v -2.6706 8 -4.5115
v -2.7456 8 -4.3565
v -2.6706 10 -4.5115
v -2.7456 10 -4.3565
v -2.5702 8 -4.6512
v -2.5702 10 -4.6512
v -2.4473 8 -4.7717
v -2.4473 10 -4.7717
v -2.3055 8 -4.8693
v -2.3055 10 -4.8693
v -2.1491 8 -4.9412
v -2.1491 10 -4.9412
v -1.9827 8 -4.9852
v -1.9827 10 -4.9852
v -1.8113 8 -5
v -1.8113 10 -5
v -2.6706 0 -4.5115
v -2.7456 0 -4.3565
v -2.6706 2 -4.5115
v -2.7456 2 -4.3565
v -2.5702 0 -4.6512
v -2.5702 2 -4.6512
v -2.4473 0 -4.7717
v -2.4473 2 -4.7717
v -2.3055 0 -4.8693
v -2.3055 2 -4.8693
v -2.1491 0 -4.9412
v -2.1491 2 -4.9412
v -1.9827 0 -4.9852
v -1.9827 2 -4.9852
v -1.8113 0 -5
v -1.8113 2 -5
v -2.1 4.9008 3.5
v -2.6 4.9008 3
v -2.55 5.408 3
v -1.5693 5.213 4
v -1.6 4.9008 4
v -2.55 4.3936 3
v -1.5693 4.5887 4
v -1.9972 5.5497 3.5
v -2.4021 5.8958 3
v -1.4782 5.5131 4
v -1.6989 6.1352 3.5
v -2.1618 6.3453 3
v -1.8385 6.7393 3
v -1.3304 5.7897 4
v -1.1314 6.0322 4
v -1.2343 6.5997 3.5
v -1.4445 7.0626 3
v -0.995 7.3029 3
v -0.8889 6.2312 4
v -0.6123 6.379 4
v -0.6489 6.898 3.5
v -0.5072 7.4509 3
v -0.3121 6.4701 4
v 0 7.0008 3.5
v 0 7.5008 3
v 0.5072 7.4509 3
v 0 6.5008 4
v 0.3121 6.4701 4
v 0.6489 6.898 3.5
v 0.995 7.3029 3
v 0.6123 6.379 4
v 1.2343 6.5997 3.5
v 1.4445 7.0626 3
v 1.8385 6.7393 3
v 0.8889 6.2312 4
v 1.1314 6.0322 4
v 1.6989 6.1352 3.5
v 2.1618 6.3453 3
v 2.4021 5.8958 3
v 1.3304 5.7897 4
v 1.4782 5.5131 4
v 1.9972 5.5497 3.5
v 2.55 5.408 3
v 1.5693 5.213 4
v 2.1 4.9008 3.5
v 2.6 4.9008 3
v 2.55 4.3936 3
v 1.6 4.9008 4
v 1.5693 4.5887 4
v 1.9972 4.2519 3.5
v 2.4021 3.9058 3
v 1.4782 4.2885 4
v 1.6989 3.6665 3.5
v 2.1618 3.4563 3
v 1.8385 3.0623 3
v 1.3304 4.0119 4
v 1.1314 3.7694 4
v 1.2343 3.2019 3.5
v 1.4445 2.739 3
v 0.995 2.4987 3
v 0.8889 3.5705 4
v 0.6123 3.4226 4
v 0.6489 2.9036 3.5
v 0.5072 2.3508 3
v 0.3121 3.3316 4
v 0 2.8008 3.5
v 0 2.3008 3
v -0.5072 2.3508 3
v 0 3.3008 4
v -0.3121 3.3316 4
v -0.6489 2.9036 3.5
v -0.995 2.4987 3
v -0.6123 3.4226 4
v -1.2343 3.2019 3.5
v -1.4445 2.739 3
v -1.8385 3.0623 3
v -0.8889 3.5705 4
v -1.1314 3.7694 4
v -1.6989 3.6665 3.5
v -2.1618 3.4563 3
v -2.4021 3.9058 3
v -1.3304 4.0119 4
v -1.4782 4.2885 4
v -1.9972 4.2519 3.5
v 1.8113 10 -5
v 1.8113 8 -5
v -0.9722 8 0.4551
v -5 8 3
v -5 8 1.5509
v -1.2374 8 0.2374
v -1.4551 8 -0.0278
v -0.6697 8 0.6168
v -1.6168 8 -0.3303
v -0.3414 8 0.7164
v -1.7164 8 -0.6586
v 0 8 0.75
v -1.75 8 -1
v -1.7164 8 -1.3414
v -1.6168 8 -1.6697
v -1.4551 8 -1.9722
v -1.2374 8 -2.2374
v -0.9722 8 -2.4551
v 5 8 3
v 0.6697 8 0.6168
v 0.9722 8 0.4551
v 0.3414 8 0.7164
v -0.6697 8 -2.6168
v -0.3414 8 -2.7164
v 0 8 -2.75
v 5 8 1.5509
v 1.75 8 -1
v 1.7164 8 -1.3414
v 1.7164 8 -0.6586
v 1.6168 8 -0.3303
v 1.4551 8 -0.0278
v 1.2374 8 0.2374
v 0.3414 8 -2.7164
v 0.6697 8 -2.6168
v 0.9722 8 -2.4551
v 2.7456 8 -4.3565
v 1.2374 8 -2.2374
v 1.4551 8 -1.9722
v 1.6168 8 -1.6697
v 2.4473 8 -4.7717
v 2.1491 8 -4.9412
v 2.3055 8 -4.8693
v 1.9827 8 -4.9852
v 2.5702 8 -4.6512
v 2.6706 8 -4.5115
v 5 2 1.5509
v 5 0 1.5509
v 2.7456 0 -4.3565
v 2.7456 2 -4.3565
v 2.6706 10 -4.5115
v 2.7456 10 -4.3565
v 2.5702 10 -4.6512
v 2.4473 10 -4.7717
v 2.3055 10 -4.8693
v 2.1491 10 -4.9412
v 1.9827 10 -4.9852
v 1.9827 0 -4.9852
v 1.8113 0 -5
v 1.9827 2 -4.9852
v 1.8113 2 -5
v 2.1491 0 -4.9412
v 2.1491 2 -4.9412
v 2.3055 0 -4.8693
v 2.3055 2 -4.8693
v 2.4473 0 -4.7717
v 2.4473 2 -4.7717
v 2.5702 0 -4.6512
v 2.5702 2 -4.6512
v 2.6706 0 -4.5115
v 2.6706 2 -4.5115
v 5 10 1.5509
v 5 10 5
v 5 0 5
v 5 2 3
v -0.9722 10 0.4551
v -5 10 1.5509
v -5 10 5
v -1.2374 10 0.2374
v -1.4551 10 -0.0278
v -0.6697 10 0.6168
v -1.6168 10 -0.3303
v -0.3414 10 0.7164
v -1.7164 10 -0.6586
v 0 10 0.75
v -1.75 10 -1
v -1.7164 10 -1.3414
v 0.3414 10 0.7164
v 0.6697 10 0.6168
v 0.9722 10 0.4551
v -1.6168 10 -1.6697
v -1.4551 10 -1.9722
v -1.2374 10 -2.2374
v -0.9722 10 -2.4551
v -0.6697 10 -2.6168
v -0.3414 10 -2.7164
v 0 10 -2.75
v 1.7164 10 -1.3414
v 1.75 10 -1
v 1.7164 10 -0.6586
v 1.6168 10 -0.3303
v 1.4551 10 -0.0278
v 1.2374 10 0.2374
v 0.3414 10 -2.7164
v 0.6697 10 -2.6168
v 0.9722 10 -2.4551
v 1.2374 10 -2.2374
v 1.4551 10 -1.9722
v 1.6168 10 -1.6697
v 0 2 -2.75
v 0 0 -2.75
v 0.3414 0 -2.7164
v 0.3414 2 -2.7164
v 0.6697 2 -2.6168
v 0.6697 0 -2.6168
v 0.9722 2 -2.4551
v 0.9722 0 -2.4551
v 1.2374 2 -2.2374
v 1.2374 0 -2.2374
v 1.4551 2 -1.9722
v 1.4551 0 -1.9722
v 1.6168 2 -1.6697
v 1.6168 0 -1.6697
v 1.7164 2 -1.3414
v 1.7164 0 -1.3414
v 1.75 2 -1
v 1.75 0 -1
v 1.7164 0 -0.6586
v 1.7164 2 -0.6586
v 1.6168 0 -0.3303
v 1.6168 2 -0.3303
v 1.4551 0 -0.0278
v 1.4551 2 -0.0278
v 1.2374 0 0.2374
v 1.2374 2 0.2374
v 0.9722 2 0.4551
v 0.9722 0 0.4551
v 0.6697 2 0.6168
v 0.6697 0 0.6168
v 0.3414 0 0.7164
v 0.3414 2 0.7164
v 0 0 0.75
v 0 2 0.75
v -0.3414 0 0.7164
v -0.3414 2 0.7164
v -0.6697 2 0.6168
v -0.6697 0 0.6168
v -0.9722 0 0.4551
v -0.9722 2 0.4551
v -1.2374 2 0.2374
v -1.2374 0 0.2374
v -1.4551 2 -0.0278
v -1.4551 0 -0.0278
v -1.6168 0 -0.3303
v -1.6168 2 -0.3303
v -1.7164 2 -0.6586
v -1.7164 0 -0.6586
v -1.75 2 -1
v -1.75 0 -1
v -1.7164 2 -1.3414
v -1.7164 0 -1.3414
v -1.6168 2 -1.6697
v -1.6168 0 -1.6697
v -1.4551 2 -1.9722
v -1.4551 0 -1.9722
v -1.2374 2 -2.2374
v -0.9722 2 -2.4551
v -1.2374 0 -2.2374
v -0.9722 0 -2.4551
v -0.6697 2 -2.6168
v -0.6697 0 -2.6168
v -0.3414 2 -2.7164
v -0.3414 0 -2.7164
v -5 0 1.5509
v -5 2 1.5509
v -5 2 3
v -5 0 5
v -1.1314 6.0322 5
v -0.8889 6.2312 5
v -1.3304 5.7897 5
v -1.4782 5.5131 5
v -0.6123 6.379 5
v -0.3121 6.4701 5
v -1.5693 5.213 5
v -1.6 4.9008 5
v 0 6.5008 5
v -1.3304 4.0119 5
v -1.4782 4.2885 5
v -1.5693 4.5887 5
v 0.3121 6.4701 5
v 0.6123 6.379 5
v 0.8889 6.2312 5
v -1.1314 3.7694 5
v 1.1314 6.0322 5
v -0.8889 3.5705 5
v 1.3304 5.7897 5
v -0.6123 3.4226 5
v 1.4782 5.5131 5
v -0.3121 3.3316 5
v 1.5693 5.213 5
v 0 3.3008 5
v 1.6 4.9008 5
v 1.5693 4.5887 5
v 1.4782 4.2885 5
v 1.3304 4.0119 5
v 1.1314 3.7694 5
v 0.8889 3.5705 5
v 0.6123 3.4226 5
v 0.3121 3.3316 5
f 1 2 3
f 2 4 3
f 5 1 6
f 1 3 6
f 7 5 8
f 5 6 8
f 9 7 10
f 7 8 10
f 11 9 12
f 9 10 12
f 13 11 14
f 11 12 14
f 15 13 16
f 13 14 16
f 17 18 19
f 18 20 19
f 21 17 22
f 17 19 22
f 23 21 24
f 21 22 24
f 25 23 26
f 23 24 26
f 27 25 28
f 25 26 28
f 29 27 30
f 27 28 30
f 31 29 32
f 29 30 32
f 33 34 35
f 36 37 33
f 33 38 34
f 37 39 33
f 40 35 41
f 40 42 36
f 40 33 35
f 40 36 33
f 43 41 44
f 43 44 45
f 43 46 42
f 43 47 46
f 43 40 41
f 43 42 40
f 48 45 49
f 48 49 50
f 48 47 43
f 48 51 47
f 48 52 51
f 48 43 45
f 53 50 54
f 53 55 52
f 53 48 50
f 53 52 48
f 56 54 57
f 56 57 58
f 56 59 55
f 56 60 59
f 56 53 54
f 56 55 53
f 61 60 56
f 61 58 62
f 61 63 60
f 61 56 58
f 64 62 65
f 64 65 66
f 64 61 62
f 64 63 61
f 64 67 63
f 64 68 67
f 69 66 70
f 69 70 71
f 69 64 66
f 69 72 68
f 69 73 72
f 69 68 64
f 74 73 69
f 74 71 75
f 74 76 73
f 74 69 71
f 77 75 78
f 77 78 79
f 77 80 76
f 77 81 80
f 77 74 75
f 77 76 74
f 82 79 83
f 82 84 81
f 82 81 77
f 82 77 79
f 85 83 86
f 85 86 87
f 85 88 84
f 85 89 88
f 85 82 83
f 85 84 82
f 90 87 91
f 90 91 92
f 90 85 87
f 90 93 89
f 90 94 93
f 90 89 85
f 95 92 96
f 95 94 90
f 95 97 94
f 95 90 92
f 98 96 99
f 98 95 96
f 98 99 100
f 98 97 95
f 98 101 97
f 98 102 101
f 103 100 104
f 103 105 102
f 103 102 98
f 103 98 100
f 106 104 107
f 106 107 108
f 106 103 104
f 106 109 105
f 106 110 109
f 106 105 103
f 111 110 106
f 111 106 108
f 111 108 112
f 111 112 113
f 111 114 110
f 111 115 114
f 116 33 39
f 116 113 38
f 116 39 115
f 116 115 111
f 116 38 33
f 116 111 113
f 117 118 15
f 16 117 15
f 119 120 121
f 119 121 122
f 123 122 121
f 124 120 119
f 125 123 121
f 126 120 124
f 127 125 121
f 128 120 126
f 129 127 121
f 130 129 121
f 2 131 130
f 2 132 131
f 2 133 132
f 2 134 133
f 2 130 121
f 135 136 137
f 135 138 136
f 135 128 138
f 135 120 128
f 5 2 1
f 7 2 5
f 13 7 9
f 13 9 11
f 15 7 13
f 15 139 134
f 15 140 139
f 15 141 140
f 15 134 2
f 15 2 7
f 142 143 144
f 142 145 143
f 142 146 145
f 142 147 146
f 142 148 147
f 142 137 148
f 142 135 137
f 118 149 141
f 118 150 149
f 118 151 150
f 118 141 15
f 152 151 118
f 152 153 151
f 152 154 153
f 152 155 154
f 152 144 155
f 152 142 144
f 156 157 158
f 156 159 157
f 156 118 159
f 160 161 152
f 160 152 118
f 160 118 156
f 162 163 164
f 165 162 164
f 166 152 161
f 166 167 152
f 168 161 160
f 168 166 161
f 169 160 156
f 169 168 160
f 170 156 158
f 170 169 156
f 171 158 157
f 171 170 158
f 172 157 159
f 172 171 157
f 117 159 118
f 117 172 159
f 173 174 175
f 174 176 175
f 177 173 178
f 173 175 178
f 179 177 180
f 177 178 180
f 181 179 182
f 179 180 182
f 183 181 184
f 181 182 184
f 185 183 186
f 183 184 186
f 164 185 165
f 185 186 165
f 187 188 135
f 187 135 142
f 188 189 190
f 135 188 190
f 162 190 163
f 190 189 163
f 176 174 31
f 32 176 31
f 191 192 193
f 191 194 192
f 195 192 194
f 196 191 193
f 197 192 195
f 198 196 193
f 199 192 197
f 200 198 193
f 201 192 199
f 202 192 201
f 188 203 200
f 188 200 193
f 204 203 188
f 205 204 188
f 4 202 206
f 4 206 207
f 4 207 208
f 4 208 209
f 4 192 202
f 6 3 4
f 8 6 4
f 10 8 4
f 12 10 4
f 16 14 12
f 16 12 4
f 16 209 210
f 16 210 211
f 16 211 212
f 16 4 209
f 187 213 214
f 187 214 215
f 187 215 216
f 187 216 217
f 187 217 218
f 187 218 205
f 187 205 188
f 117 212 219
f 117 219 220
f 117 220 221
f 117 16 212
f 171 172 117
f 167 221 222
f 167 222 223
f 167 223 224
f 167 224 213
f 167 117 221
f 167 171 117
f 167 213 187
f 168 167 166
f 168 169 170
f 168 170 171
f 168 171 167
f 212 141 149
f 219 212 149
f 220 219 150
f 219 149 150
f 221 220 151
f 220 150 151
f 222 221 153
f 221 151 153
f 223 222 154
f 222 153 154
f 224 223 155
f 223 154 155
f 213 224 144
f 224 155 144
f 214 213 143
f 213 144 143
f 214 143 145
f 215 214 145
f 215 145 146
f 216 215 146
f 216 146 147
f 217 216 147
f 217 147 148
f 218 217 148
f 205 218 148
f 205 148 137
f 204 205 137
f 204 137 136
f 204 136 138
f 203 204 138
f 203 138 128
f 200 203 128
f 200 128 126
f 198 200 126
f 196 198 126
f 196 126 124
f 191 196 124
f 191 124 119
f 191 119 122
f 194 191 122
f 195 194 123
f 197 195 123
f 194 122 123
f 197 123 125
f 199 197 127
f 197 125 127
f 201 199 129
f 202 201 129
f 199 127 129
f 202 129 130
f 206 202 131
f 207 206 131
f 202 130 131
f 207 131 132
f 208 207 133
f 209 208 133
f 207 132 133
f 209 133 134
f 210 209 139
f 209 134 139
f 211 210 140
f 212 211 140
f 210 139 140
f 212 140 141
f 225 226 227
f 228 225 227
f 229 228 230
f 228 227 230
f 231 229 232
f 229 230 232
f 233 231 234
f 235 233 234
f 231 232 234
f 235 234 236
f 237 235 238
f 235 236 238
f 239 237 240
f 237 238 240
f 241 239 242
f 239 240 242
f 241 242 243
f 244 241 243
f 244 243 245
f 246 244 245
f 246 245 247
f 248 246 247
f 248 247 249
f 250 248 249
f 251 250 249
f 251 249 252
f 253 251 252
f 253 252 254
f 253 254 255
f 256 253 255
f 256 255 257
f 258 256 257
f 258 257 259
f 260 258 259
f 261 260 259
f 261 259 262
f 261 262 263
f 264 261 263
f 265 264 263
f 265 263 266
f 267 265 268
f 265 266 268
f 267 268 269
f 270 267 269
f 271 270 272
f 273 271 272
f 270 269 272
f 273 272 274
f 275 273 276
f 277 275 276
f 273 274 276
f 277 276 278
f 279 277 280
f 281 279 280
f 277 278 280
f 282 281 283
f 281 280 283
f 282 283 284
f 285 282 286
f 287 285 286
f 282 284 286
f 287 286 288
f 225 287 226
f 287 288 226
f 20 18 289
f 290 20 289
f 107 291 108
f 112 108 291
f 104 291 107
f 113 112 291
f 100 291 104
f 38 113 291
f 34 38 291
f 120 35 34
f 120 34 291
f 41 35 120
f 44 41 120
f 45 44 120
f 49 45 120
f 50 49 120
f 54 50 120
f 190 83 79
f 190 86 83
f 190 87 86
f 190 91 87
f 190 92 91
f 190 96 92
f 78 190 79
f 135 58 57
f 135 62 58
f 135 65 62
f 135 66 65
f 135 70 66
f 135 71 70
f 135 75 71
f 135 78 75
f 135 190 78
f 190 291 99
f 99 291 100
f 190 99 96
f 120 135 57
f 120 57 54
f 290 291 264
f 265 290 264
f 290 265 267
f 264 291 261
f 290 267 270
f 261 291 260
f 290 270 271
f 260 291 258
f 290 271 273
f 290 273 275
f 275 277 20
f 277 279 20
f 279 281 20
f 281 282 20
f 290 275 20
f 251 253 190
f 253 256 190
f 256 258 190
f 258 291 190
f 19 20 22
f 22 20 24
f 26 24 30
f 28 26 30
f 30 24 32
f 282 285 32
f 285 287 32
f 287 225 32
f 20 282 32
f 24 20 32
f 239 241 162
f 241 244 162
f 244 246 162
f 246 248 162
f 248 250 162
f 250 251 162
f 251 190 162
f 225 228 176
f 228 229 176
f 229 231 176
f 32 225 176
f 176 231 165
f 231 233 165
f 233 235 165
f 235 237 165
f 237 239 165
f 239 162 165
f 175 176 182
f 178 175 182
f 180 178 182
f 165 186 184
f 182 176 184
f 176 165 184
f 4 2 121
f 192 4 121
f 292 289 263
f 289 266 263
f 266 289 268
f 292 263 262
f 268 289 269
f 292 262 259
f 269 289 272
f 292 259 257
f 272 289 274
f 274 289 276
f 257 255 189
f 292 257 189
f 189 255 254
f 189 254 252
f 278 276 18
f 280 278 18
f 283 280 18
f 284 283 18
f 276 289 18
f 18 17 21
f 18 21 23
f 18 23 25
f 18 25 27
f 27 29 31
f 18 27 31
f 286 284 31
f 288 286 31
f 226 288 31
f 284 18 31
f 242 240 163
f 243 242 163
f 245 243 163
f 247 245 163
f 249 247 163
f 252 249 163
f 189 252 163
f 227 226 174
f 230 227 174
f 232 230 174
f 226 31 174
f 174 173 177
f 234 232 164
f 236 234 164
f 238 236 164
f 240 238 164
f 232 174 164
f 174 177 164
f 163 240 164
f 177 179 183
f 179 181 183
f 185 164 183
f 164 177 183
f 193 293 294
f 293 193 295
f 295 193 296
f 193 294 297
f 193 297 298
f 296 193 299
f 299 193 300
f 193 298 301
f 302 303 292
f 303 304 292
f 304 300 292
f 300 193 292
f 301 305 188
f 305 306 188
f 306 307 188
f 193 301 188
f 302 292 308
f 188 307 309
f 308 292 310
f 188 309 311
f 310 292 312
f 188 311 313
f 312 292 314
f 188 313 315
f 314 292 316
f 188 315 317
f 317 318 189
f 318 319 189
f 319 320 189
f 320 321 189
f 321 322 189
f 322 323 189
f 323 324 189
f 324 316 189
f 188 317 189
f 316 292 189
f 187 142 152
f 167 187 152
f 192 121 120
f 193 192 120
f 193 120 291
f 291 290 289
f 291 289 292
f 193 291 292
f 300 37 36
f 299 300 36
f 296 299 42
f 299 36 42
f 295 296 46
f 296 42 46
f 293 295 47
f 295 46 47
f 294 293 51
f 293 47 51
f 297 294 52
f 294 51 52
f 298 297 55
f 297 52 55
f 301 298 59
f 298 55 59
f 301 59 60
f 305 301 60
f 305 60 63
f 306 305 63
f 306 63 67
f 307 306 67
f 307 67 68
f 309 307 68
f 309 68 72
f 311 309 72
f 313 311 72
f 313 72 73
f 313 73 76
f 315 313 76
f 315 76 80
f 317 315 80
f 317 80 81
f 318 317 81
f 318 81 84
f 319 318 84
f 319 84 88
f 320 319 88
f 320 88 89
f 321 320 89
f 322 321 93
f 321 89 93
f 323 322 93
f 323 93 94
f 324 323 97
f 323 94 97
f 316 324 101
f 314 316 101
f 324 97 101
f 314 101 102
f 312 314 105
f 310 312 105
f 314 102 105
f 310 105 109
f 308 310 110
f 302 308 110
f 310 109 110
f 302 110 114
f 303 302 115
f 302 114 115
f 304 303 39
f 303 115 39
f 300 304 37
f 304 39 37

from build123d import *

# Parameters (mm, degrees)
EXTRUDE_1_DEPTH     = 10
SKETCH_2_W          = 8
SKETCH_2_H          = 6
CUT_EXTRUDE_1_DEPTH = 10
SKETCH_3_R          = 1.75
CUT_EXTRUDE_2_DEPTH = 10
FILLET_1_R          = 1
SKETCH_4_R          = 1.6
CUT_EXTRUDE_3_DEPTH = 10
CHAMFER_1_SIZE      = 1


with BuildPart() as part:
    # 草图1 → 凸台-拉伸1 (new body)
    with BuildSketch(Plane(origin=(0, 0, 0), x_dir=(1, 0, 0), z_dir=(0, 1, 0))):
        Polygon((-2.5, 5), (-5, -1.550851348), (-5, -5), (5, -5), (5, -1.550851348), (2.5, 5), align=None)
    extrude(amount=EXTRUDE_1_DEPTH)

    # 草图2 → 切除-拉伸1 (cut)
    with BuildSketch(Plane(origin=(5, 0, 0), x_dir=(0, 0, -1), z_dir=(1, 0, 0))):
        with Locations((1, 5)):
            Rectangle(SKETCH_2_W, SKETCH_2_H)
    extrude(amount=-CUT_EXTRUDE_1_DEPTH, mode=Mode.SUBTRACT)

    # 草图3 → 切除-拉伸2 (cut)
    with BuildSketch(Plane.XZ):
        with Locations(Location((0, -1, 0), (0, 0, 270))):
            Circle(SKETCH_3_R)
    extrude(amount=-CUT_EXTRUDE_2_DEPTH, mode=Mode.SUBTRACT)

    # 圆角1
    fillet_1_edges = [part.edges().sort_by_distance(p)[0] for p in [
        (-2.5, 9, -5),
        (2.5, 9, -5),
        (-2.5, 1, -5),
        (2.5, 1, -5),
    ]]
    fillet(fillet_1_edges, radius=FILLET_1_R)

    # 草图4 → 切除-拉伸3 (cut)
    with BuildSketch(Plane(origin=(0, 0, 3), x_dir=(-1, 0, 0), z_dir=(0, 0, -1))):
        with Locations((0, 4.900814168)):
            Circle(SKETCH_4_R)
    extrude(amount=-CUT_EXTRUDE_3_DEPTH, mode=Mode.SUBTRACT)

    # 倒角1
    chamfer_1_edges = [part.edges().sort_by_distance(p)[0] for p in [
        (1.6, 4.900814168, 3),
    ]]
    chamfer(chamfer_1_edges, length=CHAMFER_1_SIZE)


solid = part.part
